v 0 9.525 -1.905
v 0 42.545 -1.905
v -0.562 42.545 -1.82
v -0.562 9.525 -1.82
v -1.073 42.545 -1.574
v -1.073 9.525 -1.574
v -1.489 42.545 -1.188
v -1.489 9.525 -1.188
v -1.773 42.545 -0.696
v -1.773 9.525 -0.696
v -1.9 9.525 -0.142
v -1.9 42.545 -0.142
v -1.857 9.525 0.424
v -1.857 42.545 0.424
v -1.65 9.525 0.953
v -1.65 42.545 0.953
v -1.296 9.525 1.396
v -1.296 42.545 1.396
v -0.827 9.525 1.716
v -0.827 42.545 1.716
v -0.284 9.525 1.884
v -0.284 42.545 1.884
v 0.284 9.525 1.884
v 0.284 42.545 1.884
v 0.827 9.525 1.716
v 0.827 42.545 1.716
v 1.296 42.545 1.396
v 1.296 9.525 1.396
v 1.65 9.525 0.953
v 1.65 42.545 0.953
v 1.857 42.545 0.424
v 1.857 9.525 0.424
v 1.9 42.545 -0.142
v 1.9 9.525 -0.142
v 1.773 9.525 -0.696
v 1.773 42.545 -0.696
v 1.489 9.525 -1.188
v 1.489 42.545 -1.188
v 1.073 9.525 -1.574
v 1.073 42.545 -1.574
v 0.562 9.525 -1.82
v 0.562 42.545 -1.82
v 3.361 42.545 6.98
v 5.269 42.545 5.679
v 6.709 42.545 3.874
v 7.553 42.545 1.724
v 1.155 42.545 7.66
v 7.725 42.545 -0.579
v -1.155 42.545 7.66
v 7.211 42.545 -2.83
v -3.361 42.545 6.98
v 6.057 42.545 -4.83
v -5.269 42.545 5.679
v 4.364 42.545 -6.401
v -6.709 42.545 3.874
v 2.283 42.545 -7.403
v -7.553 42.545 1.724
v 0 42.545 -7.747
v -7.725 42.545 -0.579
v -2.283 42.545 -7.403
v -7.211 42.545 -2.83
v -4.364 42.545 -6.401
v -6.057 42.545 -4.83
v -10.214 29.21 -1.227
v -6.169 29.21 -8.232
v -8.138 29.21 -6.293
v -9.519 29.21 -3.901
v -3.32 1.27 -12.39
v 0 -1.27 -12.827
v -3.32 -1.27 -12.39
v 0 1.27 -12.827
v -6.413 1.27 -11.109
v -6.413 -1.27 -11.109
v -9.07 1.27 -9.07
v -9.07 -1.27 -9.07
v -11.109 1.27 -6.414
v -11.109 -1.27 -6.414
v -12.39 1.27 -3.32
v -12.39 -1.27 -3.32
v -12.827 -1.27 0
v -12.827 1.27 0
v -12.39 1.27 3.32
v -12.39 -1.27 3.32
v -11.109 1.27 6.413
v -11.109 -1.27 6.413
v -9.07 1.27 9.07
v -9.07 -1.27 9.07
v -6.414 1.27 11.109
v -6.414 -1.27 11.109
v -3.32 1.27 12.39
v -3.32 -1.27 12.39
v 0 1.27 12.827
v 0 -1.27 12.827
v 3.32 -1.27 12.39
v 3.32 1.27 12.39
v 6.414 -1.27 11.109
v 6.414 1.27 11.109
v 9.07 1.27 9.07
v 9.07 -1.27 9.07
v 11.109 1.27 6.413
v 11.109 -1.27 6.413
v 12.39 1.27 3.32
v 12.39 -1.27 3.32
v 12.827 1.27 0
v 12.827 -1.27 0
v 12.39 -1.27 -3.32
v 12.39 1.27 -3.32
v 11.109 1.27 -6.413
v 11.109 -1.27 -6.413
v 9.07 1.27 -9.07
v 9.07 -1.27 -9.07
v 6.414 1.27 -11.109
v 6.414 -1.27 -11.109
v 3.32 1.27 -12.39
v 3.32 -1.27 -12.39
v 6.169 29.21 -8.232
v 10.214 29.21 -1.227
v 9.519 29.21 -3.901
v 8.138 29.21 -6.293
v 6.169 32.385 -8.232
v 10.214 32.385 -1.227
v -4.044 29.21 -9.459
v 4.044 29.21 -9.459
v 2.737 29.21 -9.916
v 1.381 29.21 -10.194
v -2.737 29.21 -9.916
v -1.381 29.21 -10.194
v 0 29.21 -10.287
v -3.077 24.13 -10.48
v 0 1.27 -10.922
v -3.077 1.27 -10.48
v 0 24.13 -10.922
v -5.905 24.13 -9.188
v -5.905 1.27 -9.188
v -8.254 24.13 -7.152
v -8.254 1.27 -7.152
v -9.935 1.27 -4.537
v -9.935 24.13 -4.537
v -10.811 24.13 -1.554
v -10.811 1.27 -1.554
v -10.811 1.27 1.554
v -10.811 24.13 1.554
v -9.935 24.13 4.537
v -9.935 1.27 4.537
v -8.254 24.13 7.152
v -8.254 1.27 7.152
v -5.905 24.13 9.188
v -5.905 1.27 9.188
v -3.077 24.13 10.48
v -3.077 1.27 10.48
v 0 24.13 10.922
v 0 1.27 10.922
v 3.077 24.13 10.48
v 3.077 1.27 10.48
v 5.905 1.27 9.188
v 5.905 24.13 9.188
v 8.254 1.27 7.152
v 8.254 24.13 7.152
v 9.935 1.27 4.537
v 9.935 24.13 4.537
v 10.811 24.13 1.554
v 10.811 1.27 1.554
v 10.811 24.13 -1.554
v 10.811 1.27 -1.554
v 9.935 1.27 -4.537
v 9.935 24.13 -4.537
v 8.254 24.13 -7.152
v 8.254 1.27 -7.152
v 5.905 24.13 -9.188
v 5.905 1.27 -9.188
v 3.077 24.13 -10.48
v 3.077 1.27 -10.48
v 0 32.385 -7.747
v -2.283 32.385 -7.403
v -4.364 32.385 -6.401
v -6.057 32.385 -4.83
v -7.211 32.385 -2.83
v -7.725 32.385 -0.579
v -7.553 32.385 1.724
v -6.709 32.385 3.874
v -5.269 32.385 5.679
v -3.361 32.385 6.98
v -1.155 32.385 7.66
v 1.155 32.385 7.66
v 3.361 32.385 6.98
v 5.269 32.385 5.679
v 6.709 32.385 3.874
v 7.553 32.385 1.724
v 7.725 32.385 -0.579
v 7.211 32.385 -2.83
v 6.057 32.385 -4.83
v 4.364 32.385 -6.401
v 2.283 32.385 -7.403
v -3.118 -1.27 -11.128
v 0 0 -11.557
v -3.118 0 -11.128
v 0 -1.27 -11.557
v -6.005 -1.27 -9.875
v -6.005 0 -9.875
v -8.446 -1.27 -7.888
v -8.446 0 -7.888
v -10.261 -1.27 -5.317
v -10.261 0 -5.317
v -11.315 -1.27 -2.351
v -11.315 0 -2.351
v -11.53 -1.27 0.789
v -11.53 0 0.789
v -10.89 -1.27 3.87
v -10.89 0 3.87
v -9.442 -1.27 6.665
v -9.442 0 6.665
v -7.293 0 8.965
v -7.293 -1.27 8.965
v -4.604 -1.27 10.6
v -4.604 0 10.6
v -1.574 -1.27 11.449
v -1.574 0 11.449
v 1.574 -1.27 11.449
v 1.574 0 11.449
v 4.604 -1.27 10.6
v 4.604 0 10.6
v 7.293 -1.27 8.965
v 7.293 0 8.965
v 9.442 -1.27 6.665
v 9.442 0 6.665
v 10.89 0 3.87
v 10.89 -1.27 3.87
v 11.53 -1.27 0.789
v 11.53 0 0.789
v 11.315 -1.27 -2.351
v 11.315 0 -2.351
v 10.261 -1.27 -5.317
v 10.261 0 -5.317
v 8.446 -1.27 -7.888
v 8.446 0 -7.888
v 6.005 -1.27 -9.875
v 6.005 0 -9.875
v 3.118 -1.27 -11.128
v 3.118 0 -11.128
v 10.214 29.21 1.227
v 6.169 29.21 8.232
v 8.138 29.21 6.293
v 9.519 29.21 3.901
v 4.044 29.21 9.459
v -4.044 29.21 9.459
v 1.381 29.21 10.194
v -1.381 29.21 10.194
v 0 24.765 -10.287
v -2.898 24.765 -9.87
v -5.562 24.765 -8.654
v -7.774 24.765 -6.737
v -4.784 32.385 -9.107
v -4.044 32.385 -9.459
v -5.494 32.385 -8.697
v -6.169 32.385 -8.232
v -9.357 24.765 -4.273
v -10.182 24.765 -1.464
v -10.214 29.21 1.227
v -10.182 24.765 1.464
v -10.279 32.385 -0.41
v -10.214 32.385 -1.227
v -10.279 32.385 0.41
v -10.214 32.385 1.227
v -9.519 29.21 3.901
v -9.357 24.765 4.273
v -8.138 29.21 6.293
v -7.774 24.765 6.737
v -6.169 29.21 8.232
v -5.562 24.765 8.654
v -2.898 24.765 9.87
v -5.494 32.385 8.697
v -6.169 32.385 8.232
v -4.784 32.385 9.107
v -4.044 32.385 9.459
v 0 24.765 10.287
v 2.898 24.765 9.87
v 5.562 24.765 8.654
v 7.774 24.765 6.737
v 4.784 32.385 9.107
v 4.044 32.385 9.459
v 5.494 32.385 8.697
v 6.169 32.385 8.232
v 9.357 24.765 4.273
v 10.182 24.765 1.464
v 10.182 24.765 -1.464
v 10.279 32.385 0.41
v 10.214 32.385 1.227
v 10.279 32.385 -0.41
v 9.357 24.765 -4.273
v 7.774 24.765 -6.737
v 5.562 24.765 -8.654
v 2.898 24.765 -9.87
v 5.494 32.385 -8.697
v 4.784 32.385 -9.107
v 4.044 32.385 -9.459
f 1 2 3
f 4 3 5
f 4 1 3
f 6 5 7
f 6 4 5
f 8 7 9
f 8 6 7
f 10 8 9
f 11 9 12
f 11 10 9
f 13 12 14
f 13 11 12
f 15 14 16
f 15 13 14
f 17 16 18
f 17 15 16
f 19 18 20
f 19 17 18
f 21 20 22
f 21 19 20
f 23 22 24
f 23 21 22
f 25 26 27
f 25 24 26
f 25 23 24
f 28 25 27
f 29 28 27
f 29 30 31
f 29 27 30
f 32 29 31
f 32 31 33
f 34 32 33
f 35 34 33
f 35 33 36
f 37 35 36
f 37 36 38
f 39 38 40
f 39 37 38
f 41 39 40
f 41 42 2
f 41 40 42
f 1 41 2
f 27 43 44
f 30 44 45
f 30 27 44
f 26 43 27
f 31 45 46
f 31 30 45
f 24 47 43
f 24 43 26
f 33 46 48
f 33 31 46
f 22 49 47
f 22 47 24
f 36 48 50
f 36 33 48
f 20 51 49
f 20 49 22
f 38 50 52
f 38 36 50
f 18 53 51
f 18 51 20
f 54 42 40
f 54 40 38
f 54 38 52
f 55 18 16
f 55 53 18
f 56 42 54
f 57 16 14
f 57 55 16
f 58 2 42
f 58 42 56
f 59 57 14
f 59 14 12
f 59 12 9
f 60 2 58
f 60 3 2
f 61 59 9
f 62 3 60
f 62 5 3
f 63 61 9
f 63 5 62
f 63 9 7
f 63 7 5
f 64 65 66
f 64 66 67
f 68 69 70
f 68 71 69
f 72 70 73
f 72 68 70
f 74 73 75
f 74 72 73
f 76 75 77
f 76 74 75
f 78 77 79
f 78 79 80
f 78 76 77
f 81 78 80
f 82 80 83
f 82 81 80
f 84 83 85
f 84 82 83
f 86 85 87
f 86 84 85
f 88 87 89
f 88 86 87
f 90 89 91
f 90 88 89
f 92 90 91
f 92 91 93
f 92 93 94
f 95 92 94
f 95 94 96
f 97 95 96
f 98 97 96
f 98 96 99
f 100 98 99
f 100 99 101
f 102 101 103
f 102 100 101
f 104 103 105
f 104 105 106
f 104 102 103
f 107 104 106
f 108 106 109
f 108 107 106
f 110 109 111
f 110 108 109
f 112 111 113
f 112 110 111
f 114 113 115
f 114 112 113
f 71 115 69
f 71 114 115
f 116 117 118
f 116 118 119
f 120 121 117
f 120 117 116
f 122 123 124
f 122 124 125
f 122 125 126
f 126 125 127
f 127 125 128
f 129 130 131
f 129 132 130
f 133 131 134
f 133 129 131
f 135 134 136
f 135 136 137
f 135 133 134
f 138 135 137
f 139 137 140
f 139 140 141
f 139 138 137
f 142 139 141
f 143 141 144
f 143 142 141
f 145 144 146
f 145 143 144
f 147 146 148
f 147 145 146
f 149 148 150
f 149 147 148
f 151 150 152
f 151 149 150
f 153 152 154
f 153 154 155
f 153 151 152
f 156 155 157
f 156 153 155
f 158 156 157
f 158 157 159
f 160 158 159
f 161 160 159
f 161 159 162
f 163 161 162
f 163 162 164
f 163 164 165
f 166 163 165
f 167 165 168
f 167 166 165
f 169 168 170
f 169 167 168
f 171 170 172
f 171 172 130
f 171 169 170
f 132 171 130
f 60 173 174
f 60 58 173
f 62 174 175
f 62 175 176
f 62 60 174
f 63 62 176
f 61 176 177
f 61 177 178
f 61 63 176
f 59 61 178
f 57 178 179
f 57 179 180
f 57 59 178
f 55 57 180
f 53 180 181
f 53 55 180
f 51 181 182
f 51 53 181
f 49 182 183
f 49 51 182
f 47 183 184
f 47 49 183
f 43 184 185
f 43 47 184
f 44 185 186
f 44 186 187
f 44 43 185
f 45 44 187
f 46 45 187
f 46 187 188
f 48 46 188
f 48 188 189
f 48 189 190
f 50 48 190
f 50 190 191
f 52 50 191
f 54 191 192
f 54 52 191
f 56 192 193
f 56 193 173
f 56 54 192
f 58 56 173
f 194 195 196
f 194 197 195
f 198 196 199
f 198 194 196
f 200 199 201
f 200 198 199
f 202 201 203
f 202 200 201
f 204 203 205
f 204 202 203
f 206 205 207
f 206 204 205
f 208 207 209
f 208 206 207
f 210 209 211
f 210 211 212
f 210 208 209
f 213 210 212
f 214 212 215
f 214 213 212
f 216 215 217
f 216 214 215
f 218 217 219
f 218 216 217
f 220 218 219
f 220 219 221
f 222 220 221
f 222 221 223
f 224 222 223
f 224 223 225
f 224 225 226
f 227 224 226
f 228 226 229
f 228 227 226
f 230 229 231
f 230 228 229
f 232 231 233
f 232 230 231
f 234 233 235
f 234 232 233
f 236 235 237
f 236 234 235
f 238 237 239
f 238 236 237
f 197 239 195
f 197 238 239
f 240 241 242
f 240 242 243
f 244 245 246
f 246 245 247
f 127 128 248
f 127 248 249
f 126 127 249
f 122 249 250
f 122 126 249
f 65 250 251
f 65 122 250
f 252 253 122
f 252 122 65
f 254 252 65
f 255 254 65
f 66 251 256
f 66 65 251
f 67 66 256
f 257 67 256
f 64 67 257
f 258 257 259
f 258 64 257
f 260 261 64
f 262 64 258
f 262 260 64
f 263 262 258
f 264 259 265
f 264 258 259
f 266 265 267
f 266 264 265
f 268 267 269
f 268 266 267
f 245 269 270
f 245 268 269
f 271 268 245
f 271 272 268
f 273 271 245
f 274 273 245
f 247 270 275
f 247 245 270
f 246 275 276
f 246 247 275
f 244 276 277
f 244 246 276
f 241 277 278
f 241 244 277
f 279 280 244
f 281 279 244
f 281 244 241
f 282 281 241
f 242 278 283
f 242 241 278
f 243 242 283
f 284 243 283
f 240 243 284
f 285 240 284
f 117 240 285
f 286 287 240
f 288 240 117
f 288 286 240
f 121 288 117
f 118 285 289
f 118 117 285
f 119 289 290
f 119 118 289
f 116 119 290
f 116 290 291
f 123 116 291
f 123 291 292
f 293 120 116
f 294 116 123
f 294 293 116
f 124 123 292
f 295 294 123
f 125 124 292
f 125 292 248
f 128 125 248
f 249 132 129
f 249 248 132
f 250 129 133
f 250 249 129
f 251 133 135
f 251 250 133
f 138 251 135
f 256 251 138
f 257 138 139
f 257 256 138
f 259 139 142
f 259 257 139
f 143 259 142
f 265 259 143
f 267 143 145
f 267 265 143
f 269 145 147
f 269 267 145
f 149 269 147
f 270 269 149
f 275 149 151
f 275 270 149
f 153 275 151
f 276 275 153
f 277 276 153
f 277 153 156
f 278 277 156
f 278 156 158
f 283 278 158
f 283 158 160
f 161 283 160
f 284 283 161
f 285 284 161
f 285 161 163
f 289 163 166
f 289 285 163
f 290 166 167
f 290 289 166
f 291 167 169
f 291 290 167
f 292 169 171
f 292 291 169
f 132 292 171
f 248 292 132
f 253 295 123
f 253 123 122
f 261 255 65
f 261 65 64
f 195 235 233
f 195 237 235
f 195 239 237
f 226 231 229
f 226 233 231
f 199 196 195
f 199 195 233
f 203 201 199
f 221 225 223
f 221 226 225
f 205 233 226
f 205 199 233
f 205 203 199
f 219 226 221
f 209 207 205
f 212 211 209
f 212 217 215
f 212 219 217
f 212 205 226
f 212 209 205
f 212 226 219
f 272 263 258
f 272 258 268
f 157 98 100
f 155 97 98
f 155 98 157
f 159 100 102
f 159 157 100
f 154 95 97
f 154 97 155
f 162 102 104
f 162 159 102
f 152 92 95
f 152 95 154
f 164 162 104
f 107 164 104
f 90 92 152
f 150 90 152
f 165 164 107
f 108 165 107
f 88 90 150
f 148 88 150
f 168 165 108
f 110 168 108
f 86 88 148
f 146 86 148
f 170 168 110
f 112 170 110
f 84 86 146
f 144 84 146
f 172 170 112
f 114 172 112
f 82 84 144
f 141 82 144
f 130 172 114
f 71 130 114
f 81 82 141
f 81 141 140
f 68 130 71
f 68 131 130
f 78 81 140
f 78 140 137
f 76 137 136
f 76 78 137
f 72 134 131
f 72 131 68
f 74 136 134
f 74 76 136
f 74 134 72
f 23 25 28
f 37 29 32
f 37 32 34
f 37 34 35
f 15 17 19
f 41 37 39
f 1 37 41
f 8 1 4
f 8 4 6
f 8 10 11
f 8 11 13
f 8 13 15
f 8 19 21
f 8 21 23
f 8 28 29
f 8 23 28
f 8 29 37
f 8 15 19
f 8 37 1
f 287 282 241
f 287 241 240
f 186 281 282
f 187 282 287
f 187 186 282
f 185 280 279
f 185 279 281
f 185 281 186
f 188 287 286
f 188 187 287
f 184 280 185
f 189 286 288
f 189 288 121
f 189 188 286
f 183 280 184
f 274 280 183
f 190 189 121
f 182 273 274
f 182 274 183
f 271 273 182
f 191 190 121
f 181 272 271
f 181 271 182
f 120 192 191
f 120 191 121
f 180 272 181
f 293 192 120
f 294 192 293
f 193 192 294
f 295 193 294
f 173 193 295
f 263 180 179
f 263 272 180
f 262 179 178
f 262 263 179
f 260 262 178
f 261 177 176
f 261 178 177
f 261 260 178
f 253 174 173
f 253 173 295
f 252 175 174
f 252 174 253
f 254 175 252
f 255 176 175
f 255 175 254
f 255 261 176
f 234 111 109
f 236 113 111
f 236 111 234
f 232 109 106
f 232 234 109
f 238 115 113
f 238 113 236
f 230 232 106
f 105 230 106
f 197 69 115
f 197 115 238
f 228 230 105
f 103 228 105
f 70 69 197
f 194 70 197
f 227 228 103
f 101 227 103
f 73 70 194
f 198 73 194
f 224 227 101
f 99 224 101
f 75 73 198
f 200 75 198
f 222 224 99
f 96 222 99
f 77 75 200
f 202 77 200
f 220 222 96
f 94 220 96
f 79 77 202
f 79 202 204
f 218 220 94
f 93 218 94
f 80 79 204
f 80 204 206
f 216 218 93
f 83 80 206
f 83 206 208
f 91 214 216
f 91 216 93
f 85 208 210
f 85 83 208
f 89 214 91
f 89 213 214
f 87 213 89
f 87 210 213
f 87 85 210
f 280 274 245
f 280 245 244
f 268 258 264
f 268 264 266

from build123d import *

# Parameters (mm, degrees)
SKETCH2_R               = 12.827
CUT_EXTRUDE1_DEPTH      = 3.175
CUT_EXTRUDE2_DEPTH      = 48.421704767
CUT_EXTRUDE2_DEPTH_BACK = 33.02
SKETCH3_R               = 1.905


with BuildPart() as part:
    # Sketch1 → Revolve1 (revolve)
    with BuildSketch(Plane.XY, mode=Mode.PRIVATE) as revolve1_sk:
        Polygon((0, 0), (11.557, 0), (11.557, -1.27), (12.827, -1.27), (12.827, 1.27), (10.922, 1.27), (10.922, 24.13), (10.287, 24.765), (10.287, 32.385), (7.747, 32.385), (7.747, 42.545), (0, 42.545), (0, 32.385), align=None)
    revolve(revolve1_sk.sketch.rotate(Axis((0, 0, 0), (0, 1, 0)), 90), axis=Axis((0, 0, 0), (0, 1, 0)))

    # Sketch2 → Cut-Extrude1 (cut)
    with BuildSketch(Plane(origin=(0, 32.385, 0), x_dir=(1, 0, 0), z_dir=(0, 1, 0))):
        with Locations(Location((0, 0, 0), (0, 0, 90))):
            Circle(SKETCH2_R)
        Polygon((-10.922, 0), (-5.461, -9.45872946), (5.461, -9.45872946), (10.922, 0), (5.461, 9.45872946), (-5.461, 9.45872946), align=None, mode=Mode.SUBTRACT)
    extrude(amount=-CUT_EXTRUDE1_DEPTH, mode=Mode.SUBTRACT)

    # Sketch3 → Cut-Extrude2 (cut, two sides: drawn at the far end of the back side and taken through both)
    with BuildSketch(Plane(origin=(0, 42.545, 0), x_dir=(1, 0, 0), z_dir=(0, 1, 0)).offset(-CUT_EXTRUDE2_DEPTH_BACK)):
        with Locations(Location((0, 0, 0), (0, 0, 90))):
            Circle(SKETCH3_R)
    extrude(amount=CUT_EXTRUDE2_DEPTH + CUT_EXTRUDE2_DEPTH_BACK, mode=Mode.SUBTRACT)


solid = part.part
